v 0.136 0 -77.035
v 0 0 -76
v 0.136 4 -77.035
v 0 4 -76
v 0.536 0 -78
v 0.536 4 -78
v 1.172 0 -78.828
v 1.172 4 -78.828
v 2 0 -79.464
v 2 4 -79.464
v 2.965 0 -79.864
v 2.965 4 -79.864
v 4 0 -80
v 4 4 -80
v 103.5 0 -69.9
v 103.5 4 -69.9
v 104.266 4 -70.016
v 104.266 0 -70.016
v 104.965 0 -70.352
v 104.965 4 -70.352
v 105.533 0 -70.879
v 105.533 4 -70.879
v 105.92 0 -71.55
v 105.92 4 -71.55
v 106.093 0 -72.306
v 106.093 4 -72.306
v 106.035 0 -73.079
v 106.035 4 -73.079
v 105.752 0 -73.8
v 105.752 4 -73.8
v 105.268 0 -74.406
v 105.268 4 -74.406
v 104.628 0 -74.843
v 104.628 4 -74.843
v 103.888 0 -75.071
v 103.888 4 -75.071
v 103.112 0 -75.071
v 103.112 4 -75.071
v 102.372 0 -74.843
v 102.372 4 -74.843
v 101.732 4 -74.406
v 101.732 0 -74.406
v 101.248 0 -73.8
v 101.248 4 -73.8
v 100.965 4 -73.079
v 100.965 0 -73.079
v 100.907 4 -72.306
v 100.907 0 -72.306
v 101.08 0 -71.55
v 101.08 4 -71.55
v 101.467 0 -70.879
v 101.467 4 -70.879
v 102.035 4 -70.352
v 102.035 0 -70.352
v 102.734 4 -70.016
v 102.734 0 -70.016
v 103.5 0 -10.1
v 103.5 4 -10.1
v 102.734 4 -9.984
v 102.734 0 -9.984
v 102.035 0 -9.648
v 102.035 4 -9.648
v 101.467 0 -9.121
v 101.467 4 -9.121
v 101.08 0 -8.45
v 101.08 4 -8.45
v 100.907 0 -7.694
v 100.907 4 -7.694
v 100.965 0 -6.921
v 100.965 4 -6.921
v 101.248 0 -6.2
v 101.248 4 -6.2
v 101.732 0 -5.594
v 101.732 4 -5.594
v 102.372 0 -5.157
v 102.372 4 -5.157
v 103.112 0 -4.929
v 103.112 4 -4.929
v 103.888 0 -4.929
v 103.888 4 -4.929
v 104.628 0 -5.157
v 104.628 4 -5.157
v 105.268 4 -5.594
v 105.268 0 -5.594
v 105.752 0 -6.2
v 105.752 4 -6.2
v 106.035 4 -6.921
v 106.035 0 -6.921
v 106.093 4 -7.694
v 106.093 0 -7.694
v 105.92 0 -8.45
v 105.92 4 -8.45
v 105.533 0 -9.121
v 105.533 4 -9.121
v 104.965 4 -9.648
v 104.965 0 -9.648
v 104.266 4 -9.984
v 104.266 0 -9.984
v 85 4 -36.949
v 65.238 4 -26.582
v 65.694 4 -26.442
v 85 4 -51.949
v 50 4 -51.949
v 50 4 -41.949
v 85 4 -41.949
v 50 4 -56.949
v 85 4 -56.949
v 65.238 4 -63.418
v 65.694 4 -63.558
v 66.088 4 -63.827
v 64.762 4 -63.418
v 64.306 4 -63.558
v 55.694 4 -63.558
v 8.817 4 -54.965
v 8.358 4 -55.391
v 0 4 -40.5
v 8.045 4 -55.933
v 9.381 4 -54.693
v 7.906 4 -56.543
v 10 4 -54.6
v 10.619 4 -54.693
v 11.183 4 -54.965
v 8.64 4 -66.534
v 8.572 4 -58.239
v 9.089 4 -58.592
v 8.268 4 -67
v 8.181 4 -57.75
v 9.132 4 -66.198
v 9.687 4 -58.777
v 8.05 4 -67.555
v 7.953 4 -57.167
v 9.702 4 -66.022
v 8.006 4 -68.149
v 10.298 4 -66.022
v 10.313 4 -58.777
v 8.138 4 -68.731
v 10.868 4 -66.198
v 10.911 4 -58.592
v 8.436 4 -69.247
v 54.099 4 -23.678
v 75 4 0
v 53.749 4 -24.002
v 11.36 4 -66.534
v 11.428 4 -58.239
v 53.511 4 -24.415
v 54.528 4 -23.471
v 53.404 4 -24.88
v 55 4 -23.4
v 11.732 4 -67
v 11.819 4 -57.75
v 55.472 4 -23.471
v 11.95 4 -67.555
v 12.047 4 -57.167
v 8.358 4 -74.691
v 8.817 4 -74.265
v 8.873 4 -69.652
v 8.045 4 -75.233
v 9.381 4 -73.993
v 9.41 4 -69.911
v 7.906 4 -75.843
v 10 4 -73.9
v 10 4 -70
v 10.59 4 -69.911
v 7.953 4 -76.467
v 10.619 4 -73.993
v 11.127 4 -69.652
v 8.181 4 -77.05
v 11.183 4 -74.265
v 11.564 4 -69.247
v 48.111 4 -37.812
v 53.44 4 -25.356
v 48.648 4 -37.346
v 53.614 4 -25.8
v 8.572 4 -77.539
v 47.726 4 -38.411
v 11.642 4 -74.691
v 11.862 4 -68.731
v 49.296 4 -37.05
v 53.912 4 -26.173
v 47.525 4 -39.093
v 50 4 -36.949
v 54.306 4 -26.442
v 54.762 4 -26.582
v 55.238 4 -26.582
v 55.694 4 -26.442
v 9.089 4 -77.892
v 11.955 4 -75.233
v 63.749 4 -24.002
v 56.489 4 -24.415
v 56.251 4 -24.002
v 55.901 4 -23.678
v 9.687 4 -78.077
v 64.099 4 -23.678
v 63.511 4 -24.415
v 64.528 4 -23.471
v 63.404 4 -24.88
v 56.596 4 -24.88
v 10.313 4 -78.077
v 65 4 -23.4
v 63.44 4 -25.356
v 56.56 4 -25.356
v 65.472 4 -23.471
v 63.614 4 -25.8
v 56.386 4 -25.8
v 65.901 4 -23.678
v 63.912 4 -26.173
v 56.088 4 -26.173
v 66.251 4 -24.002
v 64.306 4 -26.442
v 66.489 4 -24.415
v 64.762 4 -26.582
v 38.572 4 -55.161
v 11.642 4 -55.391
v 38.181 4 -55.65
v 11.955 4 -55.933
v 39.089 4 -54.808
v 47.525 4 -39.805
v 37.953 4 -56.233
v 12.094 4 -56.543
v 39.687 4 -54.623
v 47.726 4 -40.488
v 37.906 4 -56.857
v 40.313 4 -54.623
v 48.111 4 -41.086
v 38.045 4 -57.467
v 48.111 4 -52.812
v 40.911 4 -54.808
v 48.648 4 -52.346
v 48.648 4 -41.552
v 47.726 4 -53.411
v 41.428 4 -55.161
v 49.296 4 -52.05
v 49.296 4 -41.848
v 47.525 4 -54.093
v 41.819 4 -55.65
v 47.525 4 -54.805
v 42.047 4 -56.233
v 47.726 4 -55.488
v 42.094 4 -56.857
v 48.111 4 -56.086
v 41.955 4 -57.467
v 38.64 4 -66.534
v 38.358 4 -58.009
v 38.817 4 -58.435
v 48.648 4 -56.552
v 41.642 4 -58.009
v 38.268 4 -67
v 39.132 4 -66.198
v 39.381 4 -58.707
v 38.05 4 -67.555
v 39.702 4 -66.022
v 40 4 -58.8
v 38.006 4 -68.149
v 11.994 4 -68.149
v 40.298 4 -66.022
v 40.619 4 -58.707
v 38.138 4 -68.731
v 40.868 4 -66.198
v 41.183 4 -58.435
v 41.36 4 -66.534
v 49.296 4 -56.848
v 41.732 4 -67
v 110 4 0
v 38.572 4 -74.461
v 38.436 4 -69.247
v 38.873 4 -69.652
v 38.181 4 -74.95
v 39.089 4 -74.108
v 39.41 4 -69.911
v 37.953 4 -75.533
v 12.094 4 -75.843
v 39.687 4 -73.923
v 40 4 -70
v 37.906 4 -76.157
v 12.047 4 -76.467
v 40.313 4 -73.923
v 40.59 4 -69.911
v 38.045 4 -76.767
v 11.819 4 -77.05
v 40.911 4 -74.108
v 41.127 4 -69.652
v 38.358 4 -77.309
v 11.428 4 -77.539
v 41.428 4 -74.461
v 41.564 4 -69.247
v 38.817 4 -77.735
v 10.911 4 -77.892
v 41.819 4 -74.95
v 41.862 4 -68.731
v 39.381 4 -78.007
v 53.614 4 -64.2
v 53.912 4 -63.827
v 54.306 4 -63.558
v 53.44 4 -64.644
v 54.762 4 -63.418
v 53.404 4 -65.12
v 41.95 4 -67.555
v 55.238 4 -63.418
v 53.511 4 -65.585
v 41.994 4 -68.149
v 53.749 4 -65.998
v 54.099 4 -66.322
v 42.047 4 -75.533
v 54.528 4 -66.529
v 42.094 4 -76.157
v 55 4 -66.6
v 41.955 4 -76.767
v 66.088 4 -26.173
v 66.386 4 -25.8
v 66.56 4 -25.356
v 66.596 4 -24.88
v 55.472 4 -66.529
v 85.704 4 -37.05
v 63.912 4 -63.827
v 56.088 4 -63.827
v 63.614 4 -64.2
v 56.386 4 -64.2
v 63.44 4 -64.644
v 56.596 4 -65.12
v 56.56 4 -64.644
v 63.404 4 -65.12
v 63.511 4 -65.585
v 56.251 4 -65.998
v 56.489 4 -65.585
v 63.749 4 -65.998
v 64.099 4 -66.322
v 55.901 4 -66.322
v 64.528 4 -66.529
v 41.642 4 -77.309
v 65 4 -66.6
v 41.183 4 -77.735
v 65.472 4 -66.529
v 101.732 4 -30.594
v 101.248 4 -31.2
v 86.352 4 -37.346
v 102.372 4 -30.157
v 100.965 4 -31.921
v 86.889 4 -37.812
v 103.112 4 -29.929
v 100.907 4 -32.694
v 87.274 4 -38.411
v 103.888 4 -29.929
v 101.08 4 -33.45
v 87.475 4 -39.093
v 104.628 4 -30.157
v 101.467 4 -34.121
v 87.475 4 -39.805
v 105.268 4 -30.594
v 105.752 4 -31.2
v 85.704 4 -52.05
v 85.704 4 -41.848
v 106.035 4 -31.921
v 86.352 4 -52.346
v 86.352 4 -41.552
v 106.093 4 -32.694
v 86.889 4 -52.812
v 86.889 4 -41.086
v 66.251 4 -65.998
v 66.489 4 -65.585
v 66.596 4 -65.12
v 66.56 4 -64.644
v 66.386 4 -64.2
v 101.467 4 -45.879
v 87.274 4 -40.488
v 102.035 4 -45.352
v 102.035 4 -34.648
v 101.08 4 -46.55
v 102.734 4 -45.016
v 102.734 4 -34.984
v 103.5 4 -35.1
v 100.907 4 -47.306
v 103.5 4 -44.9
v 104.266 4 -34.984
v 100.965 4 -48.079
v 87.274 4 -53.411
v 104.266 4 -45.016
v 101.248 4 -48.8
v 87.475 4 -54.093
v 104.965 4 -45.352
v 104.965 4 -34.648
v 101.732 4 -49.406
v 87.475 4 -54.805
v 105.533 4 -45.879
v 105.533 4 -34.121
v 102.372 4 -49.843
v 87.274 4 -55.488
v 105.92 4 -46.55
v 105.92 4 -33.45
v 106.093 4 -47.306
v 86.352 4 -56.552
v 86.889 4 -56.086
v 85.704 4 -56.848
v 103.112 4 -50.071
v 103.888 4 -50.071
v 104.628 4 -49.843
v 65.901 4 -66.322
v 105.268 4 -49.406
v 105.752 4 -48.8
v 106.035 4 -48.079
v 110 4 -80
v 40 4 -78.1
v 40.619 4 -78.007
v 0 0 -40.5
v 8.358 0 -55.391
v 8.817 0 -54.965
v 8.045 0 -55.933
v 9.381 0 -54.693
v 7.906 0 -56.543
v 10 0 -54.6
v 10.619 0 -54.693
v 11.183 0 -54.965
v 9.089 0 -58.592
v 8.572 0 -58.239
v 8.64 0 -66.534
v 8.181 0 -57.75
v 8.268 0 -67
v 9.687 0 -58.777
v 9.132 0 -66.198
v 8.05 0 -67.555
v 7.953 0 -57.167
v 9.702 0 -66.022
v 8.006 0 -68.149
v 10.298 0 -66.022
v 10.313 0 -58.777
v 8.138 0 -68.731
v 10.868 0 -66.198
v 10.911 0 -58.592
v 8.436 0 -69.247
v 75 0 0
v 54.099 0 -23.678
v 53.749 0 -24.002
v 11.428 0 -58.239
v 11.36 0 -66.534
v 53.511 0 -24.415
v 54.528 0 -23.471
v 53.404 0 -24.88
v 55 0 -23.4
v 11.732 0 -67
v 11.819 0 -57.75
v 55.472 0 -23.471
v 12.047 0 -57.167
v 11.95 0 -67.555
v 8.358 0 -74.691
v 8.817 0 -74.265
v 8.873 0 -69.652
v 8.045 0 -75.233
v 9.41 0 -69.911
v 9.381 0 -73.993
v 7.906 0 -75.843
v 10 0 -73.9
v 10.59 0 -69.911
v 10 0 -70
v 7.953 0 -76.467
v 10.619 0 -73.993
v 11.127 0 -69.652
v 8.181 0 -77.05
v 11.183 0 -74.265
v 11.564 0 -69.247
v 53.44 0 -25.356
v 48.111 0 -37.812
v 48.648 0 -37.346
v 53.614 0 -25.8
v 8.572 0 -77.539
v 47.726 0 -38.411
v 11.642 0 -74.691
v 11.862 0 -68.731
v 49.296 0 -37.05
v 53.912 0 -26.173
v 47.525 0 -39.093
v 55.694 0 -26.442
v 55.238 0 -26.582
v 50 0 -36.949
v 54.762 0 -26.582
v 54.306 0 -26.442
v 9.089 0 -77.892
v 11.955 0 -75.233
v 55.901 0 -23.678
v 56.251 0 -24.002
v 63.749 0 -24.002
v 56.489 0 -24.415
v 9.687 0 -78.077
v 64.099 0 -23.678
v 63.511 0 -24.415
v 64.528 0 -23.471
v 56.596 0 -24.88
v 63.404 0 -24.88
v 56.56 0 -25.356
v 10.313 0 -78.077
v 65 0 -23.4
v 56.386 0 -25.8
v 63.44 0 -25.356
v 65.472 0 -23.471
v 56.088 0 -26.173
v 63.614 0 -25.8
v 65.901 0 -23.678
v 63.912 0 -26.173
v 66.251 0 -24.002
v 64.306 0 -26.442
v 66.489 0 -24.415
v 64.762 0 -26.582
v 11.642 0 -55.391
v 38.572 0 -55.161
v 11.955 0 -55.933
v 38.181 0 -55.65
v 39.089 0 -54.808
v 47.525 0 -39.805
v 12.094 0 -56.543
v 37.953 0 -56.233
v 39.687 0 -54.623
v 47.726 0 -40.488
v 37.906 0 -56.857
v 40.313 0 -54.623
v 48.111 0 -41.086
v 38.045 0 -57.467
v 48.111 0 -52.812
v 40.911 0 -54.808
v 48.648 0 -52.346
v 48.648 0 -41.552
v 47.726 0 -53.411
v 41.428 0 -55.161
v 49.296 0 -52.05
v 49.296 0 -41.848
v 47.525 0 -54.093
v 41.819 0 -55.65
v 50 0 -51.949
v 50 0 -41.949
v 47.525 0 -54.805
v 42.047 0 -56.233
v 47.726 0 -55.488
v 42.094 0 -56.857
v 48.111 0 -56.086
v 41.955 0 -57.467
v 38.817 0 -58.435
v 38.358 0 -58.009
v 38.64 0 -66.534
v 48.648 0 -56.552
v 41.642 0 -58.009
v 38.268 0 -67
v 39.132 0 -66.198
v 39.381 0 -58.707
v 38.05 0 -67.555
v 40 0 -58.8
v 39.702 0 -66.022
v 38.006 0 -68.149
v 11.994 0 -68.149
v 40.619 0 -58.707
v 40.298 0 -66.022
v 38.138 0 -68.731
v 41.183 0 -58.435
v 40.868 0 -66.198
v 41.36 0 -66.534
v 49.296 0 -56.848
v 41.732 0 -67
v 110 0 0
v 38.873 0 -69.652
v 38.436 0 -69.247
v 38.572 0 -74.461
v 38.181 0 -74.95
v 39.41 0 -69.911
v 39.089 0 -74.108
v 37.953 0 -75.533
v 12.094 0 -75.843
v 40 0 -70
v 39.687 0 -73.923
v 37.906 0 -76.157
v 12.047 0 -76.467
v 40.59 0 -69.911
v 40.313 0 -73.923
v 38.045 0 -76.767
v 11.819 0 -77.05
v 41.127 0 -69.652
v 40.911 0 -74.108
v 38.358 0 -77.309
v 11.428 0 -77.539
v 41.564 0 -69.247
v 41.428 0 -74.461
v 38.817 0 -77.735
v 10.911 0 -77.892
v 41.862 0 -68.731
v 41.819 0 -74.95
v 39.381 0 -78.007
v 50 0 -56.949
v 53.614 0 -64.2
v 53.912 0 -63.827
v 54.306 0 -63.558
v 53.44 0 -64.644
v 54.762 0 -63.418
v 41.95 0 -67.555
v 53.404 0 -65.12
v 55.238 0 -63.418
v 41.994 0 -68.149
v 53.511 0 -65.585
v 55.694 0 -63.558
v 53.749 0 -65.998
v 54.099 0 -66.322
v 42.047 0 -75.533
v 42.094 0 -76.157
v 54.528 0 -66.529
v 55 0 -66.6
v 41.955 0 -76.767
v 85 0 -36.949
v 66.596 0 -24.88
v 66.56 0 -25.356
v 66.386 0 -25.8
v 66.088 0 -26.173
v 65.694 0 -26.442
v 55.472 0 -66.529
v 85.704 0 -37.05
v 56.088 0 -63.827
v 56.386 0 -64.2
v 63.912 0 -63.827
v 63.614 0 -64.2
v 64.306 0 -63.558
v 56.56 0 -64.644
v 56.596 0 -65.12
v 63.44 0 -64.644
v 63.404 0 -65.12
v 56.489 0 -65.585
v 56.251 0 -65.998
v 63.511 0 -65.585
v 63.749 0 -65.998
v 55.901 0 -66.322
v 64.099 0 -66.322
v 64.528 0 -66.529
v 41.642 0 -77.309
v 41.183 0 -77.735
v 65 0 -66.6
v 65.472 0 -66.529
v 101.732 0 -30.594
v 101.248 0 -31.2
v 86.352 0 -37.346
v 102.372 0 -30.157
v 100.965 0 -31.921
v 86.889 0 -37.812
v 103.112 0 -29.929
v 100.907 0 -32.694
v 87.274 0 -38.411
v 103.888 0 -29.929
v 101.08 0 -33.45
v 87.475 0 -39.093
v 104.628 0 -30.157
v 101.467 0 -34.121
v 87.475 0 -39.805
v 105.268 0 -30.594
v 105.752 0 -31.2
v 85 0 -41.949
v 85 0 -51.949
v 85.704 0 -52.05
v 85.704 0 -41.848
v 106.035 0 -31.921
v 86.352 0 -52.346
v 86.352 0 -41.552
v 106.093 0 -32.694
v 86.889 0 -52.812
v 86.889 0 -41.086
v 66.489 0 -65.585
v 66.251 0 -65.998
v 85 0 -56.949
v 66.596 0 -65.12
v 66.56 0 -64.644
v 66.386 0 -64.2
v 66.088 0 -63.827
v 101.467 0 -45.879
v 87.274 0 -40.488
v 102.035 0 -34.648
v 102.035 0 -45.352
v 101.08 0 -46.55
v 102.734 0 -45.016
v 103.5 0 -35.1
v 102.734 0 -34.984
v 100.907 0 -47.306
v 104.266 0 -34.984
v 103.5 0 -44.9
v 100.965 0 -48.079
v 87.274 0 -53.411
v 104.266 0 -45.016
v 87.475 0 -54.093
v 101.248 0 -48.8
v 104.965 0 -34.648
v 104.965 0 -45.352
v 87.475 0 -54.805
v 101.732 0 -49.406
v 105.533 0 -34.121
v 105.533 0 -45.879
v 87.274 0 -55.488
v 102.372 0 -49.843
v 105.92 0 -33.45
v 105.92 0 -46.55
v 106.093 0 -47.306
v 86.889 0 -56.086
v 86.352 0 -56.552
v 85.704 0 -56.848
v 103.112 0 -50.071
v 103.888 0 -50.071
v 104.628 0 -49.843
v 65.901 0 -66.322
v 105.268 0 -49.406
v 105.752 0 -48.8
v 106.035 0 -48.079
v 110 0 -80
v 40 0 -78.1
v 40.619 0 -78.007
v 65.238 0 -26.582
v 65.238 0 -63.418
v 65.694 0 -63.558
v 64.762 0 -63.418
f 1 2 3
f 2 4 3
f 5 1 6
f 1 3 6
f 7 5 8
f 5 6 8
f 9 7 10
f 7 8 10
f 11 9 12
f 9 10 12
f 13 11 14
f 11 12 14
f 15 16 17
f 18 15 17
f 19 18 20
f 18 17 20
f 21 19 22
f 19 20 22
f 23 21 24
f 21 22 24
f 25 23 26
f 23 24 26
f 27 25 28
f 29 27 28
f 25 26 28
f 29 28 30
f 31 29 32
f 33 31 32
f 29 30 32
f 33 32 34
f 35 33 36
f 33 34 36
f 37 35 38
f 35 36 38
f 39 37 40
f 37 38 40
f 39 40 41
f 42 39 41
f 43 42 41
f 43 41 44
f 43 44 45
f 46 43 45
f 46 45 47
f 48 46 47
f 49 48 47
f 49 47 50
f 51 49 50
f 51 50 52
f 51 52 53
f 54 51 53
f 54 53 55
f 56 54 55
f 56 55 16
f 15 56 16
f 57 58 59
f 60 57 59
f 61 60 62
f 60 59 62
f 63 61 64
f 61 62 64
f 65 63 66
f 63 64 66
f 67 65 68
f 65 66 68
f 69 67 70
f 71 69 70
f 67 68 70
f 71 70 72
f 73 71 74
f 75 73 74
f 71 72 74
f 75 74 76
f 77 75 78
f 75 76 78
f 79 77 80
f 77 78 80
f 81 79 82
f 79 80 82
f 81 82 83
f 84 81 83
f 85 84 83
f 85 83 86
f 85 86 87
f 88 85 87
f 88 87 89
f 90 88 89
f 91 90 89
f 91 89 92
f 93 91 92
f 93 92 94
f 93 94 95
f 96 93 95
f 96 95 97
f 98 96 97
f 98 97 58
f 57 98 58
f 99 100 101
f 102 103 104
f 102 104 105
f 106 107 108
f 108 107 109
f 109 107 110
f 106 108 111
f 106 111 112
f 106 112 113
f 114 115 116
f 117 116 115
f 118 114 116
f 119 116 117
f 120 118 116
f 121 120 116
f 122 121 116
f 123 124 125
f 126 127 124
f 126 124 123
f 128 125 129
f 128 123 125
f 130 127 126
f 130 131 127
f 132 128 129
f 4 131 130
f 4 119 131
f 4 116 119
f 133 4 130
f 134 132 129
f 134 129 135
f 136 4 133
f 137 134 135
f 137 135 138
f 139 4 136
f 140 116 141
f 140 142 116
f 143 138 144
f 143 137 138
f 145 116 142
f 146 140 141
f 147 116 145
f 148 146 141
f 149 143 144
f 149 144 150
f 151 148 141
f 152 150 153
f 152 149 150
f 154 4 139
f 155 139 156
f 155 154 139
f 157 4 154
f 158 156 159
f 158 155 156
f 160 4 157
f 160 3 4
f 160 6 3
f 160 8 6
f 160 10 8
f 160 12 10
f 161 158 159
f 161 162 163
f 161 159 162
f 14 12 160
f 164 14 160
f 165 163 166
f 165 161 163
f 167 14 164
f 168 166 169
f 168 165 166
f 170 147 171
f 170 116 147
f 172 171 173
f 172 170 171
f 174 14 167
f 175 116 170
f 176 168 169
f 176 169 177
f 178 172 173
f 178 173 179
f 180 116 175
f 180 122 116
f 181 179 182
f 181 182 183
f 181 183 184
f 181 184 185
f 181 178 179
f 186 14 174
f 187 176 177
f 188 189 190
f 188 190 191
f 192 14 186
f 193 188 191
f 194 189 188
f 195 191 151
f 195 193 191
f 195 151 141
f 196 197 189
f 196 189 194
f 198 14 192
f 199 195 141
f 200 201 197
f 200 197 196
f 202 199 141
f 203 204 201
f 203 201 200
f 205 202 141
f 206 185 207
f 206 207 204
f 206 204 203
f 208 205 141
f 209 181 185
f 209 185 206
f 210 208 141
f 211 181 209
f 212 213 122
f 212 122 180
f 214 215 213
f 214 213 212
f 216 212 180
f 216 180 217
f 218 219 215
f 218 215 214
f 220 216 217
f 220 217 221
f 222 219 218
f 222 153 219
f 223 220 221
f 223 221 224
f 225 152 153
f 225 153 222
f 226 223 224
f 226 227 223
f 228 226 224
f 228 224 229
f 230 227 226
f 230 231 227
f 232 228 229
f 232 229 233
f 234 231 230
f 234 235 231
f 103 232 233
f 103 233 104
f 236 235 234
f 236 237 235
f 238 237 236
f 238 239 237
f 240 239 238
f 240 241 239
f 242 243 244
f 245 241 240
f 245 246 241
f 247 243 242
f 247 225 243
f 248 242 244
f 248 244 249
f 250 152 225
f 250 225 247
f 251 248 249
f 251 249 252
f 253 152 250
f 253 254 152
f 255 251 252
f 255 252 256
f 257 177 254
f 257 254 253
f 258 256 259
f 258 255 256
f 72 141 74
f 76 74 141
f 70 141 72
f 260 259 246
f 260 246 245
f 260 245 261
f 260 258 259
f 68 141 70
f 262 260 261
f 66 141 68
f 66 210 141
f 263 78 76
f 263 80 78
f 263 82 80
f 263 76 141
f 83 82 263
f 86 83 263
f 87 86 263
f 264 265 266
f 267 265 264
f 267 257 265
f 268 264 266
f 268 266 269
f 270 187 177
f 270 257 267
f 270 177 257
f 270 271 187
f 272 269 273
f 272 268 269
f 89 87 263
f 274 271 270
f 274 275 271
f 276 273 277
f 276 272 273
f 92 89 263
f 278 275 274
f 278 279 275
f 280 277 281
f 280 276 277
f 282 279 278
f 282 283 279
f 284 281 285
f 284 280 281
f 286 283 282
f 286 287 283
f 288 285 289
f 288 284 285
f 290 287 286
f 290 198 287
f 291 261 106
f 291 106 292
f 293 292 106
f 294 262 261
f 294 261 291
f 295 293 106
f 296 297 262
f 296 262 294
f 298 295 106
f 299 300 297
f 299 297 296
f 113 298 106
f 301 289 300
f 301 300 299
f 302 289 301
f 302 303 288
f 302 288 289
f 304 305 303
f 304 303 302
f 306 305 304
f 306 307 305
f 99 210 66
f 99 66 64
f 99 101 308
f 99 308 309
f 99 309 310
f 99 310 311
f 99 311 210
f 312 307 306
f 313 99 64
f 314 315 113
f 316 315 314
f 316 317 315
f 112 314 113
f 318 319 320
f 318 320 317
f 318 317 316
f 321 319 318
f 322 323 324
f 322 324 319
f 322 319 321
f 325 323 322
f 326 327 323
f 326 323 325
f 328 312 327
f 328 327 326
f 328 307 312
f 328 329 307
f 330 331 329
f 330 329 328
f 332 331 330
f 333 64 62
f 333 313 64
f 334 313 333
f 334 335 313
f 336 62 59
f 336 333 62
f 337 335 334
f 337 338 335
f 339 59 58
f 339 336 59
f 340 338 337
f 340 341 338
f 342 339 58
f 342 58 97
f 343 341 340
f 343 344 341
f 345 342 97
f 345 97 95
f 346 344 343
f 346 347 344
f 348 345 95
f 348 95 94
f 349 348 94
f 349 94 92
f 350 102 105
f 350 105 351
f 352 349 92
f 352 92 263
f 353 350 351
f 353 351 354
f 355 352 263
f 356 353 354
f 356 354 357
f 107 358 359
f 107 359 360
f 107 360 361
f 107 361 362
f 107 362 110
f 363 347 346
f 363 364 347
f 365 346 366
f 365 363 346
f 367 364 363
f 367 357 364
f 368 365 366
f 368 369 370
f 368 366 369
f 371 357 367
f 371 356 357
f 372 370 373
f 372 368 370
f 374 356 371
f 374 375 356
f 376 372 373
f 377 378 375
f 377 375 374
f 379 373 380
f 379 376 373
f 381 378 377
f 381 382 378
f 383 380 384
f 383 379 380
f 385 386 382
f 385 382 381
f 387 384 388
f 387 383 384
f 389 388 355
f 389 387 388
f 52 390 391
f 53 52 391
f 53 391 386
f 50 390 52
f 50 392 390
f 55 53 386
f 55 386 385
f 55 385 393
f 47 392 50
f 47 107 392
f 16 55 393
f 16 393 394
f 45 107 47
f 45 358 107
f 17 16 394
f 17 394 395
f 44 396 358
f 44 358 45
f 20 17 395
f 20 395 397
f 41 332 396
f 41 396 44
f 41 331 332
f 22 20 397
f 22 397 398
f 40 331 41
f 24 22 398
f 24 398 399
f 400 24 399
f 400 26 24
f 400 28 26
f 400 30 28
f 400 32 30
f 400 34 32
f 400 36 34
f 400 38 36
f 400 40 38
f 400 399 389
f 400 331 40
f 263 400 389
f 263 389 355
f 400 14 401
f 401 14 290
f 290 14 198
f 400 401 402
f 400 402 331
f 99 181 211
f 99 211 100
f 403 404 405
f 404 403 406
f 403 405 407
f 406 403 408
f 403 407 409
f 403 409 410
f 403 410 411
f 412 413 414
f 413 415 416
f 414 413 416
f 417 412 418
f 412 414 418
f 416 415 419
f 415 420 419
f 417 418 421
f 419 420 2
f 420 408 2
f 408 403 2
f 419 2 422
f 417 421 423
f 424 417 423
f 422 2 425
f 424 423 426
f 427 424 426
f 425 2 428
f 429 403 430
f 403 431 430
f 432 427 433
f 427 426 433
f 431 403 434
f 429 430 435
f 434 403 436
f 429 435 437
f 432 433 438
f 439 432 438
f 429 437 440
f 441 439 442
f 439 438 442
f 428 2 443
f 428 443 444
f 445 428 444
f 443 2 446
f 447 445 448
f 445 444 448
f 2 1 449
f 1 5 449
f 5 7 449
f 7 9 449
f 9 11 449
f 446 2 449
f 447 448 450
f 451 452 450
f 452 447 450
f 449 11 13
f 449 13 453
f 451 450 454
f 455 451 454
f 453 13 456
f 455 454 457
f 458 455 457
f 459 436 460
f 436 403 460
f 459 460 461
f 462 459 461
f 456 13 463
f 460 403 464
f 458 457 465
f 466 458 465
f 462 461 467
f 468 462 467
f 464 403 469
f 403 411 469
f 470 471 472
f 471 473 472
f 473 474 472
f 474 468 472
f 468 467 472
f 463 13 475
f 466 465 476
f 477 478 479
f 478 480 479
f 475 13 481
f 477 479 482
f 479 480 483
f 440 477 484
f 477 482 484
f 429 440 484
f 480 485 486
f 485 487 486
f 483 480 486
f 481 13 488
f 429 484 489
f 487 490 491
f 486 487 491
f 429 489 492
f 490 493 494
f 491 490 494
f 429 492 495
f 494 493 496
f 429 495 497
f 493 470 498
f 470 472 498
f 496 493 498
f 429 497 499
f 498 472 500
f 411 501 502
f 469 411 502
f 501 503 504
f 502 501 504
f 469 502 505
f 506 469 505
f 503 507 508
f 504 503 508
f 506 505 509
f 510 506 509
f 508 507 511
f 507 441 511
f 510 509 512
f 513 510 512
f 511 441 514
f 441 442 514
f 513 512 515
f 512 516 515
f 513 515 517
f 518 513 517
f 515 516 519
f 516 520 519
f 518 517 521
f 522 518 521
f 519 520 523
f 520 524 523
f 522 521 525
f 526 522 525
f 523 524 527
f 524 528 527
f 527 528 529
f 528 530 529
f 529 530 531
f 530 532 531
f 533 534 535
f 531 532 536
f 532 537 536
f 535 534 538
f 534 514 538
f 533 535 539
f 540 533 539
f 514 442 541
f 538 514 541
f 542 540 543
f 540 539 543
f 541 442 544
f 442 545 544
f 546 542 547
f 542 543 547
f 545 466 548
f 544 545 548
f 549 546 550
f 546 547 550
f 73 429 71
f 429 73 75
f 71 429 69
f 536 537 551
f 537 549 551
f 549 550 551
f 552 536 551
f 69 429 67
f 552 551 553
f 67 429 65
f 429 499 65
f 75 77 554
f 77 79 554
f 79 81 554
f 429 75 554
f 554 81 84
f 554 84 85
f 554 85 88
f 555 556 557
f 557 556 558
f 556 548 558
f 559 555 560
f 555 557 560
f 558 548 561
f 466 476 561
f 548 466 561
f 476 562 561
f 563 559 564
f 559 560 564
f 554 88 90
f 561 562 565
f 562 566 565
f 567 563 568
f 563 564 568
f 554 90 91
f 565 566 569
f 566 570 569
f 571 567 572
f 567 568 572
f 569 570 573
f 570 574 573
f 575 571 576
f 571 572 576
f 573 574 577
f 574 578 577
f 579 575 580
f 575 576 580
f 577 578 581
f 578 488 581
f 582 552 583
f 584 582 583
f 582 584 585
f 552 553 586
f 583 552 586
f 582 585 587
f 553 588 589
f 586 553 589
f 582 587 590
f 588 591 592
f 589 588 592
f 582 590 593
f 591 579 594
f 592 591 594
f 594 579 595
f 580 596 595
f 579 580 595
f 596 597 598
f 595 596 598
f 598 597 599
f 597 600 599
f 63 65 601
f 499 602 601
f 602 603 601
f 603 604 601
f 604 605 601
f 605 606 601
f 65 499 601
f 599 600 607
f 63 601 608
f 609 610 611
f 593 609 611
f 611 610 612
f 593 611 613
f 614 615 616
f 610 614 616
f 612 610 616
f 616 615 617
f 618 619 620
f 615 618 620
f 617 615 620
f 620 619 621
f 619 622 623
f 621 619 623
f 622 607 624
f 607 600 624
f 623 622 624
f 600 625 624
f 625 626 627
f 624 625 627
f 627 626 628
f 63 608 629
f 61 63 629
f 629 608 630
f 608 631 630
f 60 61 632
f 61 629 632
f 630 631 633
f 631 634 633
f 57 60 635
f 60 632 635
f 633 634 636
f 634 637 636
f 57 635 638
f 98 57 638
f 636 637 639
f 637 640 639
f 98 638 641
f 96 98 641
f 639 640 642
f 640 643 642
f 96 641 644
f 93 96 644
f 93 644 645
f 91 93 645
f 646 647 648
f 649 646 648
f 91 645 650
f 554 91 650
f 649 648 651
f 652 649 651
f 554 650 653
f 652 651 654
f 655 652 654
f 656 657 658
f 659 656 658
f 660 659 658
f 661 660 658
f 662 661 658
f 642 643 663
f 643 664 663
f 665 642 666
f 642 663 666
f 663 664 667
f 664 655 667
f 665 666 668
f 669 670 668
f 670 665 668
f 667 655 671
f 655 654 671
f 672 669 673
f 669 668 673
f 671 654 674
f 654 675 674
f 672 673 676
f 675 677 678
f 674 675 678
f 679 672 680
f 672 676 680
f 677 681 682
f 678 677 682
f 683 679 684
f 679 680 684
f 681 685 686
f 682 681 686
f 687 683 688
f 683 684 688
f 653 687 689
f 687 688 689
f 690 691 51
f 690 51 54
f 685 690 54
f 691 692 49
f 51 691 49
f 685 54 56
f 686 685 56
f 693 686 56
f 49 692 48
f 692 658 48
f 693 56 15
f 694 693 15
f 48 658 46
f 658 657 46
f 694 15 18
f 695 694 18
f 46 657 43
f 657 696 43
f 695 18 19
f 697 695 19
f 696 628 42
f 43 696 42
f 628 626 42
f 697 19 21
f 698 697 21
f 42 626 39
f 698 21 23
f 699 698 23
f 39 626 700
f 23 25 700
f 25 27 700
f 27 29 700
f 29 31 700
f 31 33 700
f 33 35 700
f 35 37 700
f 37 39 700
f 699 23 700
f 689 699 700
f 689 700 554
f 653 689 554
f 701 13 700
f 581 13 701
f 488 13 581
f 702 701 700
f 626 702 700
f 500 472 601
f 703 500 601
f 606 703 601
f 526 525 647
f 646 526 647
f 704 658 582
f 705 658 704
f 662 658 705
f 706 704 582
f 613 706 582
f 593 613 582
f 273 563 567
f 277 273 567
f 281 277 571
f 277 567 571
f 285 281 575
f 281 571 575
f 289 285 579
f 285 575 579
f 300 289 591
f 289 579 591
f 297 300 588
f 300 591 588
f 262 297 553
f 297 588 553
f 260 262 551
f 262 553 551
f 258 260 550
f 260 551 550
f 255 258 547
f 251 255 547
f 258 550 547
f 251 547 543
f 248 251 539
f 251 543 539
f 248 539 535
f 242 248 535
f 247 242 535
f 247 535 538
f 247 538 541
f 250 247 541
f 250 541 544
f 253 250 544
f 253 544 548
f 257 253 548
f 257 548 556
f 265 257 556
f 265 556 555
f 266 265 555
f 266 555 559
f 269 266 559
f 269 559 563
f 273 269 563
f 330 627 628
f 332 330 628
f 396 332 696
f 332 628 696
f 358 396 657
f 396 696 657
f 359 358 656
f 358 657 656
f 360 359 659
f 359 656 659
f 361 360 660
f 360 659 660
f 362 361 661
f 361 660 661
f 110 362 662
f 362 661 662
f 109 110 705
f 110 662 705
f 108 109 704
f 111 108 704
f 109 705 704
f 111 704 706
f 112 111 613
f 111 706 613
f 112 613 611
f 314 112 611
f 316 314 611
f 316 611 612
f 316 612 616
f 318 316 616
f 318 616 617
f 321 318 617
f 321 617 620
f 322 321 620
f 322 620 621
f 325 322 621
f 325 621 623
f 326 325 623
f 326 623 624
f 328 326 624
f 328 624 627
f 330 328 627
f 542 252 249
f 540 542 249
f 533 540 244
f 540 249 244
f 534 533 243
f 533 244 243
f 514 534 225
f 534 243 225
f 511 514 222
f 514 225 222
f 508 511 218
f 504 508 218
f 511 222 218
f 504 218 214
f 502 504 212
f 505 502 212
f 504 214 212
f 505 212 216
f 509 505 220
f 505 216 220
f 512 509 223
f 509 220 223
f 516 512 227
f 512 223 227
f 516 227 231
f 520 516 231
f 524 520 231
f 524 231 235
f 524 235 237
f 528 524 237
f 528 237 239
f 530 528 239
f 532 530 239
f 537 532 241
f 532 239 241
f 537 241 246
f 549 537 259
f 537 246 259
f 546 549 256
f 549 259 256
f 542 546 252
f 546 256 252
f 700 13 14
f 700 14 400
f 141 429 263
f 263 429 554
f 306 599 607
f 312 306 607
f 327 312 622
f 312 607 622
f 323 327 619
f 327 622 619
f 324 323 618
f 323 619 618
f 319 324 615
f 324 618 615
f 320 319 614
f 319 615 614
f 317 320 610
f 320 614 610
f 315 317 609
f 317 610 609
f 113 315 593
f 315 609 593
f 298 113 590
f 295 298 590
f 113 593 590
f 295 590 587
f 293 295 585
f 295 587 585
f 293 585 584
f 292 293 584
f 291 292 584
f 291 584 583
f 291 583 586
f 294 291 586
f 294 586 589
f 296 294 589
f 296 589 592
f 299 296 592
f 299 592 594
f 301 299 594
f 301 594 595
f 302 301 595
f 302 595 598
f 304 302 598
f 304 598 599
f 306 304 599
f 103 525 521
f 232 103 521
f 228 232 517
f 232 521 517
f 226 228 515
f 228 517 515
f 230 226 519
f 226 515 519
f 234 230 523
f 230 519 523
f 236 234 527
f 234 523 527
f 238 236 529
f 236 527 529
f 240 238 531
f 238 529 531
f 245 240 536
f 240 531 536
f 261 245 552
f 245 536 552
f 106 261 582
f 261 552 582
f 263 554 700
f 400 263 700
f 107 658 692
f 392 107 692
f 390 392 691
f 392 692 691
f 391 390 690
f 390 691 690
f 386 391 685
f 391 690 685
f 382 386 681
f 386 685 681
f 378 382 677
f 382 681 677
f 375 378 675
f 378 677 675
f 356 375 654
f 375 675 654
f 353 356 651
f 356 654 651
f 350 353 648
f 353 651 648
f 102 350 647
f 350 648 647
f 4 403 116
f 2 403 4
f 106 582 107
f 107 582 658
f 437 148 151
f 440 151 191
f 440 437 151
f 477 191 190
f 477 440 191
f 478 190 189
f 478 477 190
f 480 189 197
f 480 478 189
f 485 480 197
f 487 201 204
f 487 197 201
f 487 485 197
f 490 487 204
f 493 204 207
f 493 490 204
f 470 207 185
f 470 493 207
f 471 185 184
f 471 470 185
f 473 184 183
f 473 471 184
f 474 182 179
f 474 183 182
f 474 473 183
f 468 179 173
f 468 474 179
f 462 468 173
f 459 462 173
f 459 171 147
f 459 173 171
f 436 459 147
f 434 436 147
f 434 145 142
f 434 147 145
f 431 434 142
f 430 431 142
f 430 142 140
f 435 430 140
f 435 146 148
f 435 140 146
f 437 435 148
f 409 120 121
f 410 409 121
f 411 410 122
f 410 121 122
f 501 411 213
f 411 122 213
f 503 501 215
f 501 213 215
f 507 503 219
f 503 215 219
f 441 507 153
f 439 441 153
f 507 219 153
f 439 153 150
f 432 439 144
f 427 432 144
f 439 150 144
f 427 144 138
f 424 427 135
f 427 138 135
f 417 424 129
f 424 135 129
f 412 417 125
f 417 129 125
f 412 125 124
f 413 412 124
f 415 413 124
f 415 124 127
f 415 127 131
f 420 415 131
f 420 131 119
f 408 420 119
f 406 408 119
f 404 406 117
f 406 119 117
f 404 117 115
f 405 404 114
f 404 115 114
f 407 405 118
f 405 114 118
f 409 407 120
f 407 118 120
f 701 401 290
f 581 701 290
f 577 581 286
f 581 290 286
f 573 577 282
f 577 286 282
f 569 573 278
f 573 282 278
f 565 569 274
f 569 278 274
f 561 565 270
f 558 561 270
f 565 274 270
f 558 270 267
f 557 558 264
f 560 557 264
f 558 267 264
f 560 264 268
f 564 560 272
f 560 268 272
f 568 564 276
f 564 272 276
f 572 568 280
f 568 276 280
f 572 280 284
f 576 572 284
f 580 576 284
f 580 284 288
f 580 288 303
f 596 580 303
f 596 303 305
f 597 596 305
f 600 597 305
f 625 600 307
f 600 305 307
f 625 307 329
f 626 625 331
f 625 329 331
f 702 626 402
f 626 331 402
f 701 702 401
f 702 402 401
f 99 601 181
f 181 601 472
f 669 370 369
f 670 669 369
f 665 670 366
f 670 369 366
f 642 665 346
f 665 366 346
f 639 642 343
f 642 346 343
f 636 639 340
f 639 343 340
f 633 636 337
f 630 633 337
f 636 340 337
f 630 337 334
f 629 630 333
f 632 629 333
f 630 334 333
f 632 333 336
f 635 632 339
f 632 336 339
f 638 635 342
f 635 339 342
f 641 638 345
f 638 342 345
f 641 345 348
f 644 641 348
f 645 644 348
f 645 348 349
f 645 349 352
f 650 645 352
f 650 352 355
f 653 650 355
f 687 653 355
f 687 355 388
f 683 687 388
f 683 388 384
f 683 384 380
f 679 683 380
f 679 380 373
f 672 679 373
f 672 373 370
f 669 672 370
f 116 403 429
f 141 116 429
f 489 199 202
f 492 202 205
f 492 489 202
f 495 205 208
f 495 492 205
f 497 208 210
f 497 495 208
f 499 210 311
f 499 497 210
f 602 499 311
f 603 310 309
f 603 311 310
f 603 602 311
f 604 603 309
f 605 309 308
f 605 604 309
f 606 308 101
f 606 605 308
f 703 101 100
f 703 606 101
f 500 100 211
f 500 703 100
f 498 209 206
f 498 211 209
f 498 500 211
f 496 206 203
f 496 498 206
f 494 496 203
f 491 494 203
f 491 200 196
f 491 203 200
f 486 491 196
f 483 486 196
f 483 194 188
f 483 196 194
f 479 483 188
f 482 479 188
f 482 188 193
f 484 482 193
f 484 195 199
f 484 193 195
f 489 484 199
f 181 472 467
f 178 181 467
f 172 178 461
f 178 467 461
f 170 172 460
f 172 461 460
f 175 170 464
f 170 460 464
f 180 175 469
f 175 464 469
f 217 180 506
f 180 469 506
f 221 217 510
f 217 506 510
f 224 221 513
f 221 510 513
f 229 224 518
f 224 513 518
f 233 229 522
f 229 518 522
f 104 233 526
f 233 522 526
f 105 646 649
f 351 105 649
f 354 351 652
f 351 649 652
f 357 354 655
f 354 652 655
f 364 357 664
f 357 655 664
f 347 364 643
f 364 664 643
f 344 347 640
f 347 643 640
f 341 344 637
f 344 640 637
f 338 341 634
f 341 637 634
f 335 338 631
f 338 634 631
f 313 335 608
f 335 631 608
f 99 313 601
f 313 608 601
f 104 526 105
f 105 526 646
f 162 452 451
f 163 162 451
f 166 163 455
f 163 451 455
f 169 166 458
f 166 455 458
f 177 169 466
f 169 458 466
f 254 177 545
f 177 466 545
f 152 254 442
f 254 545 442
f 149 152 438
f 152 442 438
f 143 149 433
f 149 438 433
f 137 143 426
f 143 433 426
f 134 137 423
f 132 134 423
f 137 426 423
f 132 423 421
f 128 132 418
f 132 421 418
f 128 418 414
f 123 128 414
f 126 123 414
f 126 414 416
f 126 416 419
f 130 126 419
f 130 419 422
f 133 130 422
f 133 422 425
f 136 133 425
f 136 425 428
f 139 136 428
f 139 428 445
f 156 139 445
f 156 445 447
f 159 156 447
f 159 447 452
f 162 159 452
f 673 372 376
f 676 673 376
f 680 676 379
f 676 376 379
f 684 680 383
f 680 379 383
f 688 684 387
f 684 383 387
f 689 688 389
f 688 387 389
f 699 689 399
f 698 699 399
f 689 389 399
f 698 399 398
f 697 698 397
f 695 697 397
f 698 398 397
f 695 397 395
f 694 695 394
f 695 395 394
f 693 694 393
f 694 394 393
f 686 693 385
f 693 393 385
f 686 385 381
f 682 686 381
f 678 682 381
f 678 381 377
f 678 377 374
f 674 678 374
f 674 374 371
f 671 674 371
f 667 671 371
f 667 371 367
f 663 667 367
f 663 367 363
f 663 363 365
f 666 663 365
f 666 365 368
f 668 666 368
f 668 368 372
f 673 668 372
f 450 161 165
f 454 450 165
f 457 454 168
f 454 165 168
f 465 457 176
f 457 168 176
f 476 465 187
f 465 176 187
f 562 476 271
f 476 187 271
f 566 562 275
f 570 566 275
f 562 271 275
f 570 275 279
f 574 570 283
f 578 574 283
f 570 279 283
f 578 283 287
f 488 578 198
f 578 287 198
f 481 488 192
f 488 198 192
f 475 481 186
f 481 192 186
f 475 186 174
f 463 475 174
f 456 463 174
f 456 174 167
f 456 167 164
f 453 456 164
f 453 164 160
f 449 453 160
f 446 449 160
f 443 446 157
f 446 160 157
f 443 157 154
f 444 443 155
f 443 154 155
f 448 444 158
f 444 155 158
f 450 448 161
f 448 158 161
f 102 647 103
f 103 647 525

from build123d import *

# Parameters (mm, degrees)
SKETCH_1_W          = 110
SKETCH_1_H          = 80
EXTRUDE_1_DEPTH     = 4
SKETCH_2_R          = 2.1
CUT_EXTRUDE_1_DEPTH = 4
FILLET_1_R          = 4
FILLET_2_R          = 5
SKETCH_4_R          = 2.6
CUT_EXTRUDE_2_DEPTH = 10
SKETCH_5_R          = 1.6
CUT_EXTRUDE_3_DEPTH = 10
CUT_EXTRUDE_4_DEPTH = 10
CUT_EXTRUDE_6_REACH = 138.074
SKETCH_8_R          = 2
CUT_EXTRUDE_7_DEPTH = 137.073509545


with BuildPart() as part:
    # 草图1 → 凸台-拉伸1 (new body)
    with BuildSketch(Plane(origin=(0, 0, 0), x_dir=(1, 0, 0), z_dir=(0, 1, 0))):
        with Locations((55, 40)):
            Rectangle(SKETCH_1_W, SKETCH_1_H)
    extrude(amount=EXTRUDE_1_DEPTH)

    # 草图2 → 切除-拉伸1 (cut)
    with BuildSketch(Plane(origin=(0, 4, 0), x_dir=(1, 0, 0), z_dir=(0, 1, 0))):
        with Locations(Location((10, 56.7, 0), (0, 0, 270))):
            Circle(SKETCH_2_R)
        with Locations(Location((40, 56.7, 0), (0, 0, 90))):
            Circle(SKETCH_2_R)
        with Locations(Location((10, 76, 0), (0, 0, 270))):
            Circle(SKETCH_2_R)
        with Locations(Location((40, 76, 0), (0, 0, 90))):
            Circle(SKETCH_2_R)
    extrude(amount=-CUT_EXTRUDE_1_DEPTH, mode=Mode.SUBTRACT)

    # 圆角1
    fillet_1_edges = [part.edges().sort_by_distance(p)[0] for p in [
        (0, 2, -80),
    ]]
    fillet(fillet_1_edges, radius=FILLET_1_R)

    # 圆角2
    fillet_2_edges = [part.edges().sort_by_distance(p)[0] for p in [
        (0, 2, 0),
    ]]
    fillet(fillet_2_edges, radius=FILLET_2_R)

    # 草图4 → 切除-拉伸2 (cut)
    with BuildSketch(Plane(origin=(0, 4, 0), x_dir=(1, 0, 0), z_dir=(0, 1, 0))):
        with Locations(Location((103.5, 47.5, 0), (0, 0, 270))):
            Circle(SKETCH_4_R)
        with Locations(Location((103.5, 72.5, 0), (0, 0, 270))):
            Circle(SKETCH_4_R)
        with Locations(Location((103.5, 7.5, 0), (0, 0, 90))):
            Circle(SKETCH_4_R)
        with Locations(Location((103.5, 32.5, 0), (0, 0, 90))):
            Circle(SKETCH_4_R)
    extrude(amount=-CUT_EXTRUDE_2_DEPTH, mode=Mode.SUBTRACT)

    # 草图5 → 切除-拉伸3 (cut)
    with BuildSketch(Plane.XZ):
        with Locations(Location((55, -65, 0), (0, 0, 270))):
            Circle(SKETCH_5_R)
        with Locations(Location((65, -65, 0), (0, 0, 270))):
            Circle(SKETCH_5_R)
    cut_extrude_3 = extrude(amount=-CUT_EXTRUDE_3_DEPTH, mode=Mode.SUBTRACT)

    # 草图6 → 切除-拉伸4 (cut)
    with BuildSketch(Plane.XZ):
        Polygon((0, -40.5), (75, 0), (0, 0), align=None)
    extrude(amount=-CUT_EXTRUDE_4_DEPTH, mode=Mode.SUBTRACT)

    # 草图8 → 切除-拉伸6 (cut, up to next)
    with BuildSketch(Plane.XZ, mode=Mode.PRIVATE) as cut_extrude_6_sk1:
        with Locations(Location((10, -68, 0), (0, 0, 270))):
            Circle(SKETCH_8_R)
    cut_extrude_6_tool1 = extrude(cut_extrude_6_sk1.sketch, amount=-CUT_EXTRUDE_6_REACH, mode=Mode.PRIVATE) & part.part
    # 草图8 → 切除-拉伸6 (cut, up to next)
    with BuildSketch(Plane.XZ, mode=Mode.PRIVATE) as cut_extrude_6_sk2:
        with Locations(Location((40, -68, 0), (0, 0, 270))):
            Circle(SKETCH_8_R)
    cut_extrude_6_tool2 = extrude(cut_extrude_6_sk2.sketch, amount=-CUT_EXTRUDE_6_REACH, mode=Mode.PRIVATE) & part.part
    add(cut_extrude_6_tool1.solids().sort_by_distance((10, 0, -68))[0], mode=Mode.SUBTRACT)
    add(cut_extrude_6_tool2.solids().sort_by_distance((40, 0, -68))[0], mode=Mode.SUBTRACT)

    # 镜向1: 切除-拉伸3 across plane
    add(cut_extrude_3.mirror(Plane(origin=(0, 0, -45), x_dir=(1, 0, 0), z_dir=(0, 0, -1))), mode=Mode.SUBTRACT)

    # 草图9 → 切除-拉伸7 (cut, through all)
    with BuildSketch(Plane.XZ):
        with BuildLine():
            Line((85, -36.949085991), (50, -36.949085991))
            ThreePointArc((50, -36.949085991), (47.5, -39.449085991), (50, -41.949085991))
            Line((50, -41.949085991), (85, -41.949085991))
            ThreePointArc((85, -41.949085991), (87.5, -39.449085991), (85, -36.949085991))
        make_face()
        with BuildLine():
            Line((85, -51.949085991), (50, -51.949085991))
            ThreePointArc((50, -51.949085991), (47.5, -54.449085991), (50, -56.949085991))
            Line((50, -56.949085991), (85, -56.949085991))
            ThreePointArc((85, -56.949085991), (87.5, -54.449085991), (85, -51.949085991))
        make_face()
    extrude(amount=-CUT_EXTRUDE_7_DEPTH, mode=Mode.SUBTRACT)


solid = part.part
